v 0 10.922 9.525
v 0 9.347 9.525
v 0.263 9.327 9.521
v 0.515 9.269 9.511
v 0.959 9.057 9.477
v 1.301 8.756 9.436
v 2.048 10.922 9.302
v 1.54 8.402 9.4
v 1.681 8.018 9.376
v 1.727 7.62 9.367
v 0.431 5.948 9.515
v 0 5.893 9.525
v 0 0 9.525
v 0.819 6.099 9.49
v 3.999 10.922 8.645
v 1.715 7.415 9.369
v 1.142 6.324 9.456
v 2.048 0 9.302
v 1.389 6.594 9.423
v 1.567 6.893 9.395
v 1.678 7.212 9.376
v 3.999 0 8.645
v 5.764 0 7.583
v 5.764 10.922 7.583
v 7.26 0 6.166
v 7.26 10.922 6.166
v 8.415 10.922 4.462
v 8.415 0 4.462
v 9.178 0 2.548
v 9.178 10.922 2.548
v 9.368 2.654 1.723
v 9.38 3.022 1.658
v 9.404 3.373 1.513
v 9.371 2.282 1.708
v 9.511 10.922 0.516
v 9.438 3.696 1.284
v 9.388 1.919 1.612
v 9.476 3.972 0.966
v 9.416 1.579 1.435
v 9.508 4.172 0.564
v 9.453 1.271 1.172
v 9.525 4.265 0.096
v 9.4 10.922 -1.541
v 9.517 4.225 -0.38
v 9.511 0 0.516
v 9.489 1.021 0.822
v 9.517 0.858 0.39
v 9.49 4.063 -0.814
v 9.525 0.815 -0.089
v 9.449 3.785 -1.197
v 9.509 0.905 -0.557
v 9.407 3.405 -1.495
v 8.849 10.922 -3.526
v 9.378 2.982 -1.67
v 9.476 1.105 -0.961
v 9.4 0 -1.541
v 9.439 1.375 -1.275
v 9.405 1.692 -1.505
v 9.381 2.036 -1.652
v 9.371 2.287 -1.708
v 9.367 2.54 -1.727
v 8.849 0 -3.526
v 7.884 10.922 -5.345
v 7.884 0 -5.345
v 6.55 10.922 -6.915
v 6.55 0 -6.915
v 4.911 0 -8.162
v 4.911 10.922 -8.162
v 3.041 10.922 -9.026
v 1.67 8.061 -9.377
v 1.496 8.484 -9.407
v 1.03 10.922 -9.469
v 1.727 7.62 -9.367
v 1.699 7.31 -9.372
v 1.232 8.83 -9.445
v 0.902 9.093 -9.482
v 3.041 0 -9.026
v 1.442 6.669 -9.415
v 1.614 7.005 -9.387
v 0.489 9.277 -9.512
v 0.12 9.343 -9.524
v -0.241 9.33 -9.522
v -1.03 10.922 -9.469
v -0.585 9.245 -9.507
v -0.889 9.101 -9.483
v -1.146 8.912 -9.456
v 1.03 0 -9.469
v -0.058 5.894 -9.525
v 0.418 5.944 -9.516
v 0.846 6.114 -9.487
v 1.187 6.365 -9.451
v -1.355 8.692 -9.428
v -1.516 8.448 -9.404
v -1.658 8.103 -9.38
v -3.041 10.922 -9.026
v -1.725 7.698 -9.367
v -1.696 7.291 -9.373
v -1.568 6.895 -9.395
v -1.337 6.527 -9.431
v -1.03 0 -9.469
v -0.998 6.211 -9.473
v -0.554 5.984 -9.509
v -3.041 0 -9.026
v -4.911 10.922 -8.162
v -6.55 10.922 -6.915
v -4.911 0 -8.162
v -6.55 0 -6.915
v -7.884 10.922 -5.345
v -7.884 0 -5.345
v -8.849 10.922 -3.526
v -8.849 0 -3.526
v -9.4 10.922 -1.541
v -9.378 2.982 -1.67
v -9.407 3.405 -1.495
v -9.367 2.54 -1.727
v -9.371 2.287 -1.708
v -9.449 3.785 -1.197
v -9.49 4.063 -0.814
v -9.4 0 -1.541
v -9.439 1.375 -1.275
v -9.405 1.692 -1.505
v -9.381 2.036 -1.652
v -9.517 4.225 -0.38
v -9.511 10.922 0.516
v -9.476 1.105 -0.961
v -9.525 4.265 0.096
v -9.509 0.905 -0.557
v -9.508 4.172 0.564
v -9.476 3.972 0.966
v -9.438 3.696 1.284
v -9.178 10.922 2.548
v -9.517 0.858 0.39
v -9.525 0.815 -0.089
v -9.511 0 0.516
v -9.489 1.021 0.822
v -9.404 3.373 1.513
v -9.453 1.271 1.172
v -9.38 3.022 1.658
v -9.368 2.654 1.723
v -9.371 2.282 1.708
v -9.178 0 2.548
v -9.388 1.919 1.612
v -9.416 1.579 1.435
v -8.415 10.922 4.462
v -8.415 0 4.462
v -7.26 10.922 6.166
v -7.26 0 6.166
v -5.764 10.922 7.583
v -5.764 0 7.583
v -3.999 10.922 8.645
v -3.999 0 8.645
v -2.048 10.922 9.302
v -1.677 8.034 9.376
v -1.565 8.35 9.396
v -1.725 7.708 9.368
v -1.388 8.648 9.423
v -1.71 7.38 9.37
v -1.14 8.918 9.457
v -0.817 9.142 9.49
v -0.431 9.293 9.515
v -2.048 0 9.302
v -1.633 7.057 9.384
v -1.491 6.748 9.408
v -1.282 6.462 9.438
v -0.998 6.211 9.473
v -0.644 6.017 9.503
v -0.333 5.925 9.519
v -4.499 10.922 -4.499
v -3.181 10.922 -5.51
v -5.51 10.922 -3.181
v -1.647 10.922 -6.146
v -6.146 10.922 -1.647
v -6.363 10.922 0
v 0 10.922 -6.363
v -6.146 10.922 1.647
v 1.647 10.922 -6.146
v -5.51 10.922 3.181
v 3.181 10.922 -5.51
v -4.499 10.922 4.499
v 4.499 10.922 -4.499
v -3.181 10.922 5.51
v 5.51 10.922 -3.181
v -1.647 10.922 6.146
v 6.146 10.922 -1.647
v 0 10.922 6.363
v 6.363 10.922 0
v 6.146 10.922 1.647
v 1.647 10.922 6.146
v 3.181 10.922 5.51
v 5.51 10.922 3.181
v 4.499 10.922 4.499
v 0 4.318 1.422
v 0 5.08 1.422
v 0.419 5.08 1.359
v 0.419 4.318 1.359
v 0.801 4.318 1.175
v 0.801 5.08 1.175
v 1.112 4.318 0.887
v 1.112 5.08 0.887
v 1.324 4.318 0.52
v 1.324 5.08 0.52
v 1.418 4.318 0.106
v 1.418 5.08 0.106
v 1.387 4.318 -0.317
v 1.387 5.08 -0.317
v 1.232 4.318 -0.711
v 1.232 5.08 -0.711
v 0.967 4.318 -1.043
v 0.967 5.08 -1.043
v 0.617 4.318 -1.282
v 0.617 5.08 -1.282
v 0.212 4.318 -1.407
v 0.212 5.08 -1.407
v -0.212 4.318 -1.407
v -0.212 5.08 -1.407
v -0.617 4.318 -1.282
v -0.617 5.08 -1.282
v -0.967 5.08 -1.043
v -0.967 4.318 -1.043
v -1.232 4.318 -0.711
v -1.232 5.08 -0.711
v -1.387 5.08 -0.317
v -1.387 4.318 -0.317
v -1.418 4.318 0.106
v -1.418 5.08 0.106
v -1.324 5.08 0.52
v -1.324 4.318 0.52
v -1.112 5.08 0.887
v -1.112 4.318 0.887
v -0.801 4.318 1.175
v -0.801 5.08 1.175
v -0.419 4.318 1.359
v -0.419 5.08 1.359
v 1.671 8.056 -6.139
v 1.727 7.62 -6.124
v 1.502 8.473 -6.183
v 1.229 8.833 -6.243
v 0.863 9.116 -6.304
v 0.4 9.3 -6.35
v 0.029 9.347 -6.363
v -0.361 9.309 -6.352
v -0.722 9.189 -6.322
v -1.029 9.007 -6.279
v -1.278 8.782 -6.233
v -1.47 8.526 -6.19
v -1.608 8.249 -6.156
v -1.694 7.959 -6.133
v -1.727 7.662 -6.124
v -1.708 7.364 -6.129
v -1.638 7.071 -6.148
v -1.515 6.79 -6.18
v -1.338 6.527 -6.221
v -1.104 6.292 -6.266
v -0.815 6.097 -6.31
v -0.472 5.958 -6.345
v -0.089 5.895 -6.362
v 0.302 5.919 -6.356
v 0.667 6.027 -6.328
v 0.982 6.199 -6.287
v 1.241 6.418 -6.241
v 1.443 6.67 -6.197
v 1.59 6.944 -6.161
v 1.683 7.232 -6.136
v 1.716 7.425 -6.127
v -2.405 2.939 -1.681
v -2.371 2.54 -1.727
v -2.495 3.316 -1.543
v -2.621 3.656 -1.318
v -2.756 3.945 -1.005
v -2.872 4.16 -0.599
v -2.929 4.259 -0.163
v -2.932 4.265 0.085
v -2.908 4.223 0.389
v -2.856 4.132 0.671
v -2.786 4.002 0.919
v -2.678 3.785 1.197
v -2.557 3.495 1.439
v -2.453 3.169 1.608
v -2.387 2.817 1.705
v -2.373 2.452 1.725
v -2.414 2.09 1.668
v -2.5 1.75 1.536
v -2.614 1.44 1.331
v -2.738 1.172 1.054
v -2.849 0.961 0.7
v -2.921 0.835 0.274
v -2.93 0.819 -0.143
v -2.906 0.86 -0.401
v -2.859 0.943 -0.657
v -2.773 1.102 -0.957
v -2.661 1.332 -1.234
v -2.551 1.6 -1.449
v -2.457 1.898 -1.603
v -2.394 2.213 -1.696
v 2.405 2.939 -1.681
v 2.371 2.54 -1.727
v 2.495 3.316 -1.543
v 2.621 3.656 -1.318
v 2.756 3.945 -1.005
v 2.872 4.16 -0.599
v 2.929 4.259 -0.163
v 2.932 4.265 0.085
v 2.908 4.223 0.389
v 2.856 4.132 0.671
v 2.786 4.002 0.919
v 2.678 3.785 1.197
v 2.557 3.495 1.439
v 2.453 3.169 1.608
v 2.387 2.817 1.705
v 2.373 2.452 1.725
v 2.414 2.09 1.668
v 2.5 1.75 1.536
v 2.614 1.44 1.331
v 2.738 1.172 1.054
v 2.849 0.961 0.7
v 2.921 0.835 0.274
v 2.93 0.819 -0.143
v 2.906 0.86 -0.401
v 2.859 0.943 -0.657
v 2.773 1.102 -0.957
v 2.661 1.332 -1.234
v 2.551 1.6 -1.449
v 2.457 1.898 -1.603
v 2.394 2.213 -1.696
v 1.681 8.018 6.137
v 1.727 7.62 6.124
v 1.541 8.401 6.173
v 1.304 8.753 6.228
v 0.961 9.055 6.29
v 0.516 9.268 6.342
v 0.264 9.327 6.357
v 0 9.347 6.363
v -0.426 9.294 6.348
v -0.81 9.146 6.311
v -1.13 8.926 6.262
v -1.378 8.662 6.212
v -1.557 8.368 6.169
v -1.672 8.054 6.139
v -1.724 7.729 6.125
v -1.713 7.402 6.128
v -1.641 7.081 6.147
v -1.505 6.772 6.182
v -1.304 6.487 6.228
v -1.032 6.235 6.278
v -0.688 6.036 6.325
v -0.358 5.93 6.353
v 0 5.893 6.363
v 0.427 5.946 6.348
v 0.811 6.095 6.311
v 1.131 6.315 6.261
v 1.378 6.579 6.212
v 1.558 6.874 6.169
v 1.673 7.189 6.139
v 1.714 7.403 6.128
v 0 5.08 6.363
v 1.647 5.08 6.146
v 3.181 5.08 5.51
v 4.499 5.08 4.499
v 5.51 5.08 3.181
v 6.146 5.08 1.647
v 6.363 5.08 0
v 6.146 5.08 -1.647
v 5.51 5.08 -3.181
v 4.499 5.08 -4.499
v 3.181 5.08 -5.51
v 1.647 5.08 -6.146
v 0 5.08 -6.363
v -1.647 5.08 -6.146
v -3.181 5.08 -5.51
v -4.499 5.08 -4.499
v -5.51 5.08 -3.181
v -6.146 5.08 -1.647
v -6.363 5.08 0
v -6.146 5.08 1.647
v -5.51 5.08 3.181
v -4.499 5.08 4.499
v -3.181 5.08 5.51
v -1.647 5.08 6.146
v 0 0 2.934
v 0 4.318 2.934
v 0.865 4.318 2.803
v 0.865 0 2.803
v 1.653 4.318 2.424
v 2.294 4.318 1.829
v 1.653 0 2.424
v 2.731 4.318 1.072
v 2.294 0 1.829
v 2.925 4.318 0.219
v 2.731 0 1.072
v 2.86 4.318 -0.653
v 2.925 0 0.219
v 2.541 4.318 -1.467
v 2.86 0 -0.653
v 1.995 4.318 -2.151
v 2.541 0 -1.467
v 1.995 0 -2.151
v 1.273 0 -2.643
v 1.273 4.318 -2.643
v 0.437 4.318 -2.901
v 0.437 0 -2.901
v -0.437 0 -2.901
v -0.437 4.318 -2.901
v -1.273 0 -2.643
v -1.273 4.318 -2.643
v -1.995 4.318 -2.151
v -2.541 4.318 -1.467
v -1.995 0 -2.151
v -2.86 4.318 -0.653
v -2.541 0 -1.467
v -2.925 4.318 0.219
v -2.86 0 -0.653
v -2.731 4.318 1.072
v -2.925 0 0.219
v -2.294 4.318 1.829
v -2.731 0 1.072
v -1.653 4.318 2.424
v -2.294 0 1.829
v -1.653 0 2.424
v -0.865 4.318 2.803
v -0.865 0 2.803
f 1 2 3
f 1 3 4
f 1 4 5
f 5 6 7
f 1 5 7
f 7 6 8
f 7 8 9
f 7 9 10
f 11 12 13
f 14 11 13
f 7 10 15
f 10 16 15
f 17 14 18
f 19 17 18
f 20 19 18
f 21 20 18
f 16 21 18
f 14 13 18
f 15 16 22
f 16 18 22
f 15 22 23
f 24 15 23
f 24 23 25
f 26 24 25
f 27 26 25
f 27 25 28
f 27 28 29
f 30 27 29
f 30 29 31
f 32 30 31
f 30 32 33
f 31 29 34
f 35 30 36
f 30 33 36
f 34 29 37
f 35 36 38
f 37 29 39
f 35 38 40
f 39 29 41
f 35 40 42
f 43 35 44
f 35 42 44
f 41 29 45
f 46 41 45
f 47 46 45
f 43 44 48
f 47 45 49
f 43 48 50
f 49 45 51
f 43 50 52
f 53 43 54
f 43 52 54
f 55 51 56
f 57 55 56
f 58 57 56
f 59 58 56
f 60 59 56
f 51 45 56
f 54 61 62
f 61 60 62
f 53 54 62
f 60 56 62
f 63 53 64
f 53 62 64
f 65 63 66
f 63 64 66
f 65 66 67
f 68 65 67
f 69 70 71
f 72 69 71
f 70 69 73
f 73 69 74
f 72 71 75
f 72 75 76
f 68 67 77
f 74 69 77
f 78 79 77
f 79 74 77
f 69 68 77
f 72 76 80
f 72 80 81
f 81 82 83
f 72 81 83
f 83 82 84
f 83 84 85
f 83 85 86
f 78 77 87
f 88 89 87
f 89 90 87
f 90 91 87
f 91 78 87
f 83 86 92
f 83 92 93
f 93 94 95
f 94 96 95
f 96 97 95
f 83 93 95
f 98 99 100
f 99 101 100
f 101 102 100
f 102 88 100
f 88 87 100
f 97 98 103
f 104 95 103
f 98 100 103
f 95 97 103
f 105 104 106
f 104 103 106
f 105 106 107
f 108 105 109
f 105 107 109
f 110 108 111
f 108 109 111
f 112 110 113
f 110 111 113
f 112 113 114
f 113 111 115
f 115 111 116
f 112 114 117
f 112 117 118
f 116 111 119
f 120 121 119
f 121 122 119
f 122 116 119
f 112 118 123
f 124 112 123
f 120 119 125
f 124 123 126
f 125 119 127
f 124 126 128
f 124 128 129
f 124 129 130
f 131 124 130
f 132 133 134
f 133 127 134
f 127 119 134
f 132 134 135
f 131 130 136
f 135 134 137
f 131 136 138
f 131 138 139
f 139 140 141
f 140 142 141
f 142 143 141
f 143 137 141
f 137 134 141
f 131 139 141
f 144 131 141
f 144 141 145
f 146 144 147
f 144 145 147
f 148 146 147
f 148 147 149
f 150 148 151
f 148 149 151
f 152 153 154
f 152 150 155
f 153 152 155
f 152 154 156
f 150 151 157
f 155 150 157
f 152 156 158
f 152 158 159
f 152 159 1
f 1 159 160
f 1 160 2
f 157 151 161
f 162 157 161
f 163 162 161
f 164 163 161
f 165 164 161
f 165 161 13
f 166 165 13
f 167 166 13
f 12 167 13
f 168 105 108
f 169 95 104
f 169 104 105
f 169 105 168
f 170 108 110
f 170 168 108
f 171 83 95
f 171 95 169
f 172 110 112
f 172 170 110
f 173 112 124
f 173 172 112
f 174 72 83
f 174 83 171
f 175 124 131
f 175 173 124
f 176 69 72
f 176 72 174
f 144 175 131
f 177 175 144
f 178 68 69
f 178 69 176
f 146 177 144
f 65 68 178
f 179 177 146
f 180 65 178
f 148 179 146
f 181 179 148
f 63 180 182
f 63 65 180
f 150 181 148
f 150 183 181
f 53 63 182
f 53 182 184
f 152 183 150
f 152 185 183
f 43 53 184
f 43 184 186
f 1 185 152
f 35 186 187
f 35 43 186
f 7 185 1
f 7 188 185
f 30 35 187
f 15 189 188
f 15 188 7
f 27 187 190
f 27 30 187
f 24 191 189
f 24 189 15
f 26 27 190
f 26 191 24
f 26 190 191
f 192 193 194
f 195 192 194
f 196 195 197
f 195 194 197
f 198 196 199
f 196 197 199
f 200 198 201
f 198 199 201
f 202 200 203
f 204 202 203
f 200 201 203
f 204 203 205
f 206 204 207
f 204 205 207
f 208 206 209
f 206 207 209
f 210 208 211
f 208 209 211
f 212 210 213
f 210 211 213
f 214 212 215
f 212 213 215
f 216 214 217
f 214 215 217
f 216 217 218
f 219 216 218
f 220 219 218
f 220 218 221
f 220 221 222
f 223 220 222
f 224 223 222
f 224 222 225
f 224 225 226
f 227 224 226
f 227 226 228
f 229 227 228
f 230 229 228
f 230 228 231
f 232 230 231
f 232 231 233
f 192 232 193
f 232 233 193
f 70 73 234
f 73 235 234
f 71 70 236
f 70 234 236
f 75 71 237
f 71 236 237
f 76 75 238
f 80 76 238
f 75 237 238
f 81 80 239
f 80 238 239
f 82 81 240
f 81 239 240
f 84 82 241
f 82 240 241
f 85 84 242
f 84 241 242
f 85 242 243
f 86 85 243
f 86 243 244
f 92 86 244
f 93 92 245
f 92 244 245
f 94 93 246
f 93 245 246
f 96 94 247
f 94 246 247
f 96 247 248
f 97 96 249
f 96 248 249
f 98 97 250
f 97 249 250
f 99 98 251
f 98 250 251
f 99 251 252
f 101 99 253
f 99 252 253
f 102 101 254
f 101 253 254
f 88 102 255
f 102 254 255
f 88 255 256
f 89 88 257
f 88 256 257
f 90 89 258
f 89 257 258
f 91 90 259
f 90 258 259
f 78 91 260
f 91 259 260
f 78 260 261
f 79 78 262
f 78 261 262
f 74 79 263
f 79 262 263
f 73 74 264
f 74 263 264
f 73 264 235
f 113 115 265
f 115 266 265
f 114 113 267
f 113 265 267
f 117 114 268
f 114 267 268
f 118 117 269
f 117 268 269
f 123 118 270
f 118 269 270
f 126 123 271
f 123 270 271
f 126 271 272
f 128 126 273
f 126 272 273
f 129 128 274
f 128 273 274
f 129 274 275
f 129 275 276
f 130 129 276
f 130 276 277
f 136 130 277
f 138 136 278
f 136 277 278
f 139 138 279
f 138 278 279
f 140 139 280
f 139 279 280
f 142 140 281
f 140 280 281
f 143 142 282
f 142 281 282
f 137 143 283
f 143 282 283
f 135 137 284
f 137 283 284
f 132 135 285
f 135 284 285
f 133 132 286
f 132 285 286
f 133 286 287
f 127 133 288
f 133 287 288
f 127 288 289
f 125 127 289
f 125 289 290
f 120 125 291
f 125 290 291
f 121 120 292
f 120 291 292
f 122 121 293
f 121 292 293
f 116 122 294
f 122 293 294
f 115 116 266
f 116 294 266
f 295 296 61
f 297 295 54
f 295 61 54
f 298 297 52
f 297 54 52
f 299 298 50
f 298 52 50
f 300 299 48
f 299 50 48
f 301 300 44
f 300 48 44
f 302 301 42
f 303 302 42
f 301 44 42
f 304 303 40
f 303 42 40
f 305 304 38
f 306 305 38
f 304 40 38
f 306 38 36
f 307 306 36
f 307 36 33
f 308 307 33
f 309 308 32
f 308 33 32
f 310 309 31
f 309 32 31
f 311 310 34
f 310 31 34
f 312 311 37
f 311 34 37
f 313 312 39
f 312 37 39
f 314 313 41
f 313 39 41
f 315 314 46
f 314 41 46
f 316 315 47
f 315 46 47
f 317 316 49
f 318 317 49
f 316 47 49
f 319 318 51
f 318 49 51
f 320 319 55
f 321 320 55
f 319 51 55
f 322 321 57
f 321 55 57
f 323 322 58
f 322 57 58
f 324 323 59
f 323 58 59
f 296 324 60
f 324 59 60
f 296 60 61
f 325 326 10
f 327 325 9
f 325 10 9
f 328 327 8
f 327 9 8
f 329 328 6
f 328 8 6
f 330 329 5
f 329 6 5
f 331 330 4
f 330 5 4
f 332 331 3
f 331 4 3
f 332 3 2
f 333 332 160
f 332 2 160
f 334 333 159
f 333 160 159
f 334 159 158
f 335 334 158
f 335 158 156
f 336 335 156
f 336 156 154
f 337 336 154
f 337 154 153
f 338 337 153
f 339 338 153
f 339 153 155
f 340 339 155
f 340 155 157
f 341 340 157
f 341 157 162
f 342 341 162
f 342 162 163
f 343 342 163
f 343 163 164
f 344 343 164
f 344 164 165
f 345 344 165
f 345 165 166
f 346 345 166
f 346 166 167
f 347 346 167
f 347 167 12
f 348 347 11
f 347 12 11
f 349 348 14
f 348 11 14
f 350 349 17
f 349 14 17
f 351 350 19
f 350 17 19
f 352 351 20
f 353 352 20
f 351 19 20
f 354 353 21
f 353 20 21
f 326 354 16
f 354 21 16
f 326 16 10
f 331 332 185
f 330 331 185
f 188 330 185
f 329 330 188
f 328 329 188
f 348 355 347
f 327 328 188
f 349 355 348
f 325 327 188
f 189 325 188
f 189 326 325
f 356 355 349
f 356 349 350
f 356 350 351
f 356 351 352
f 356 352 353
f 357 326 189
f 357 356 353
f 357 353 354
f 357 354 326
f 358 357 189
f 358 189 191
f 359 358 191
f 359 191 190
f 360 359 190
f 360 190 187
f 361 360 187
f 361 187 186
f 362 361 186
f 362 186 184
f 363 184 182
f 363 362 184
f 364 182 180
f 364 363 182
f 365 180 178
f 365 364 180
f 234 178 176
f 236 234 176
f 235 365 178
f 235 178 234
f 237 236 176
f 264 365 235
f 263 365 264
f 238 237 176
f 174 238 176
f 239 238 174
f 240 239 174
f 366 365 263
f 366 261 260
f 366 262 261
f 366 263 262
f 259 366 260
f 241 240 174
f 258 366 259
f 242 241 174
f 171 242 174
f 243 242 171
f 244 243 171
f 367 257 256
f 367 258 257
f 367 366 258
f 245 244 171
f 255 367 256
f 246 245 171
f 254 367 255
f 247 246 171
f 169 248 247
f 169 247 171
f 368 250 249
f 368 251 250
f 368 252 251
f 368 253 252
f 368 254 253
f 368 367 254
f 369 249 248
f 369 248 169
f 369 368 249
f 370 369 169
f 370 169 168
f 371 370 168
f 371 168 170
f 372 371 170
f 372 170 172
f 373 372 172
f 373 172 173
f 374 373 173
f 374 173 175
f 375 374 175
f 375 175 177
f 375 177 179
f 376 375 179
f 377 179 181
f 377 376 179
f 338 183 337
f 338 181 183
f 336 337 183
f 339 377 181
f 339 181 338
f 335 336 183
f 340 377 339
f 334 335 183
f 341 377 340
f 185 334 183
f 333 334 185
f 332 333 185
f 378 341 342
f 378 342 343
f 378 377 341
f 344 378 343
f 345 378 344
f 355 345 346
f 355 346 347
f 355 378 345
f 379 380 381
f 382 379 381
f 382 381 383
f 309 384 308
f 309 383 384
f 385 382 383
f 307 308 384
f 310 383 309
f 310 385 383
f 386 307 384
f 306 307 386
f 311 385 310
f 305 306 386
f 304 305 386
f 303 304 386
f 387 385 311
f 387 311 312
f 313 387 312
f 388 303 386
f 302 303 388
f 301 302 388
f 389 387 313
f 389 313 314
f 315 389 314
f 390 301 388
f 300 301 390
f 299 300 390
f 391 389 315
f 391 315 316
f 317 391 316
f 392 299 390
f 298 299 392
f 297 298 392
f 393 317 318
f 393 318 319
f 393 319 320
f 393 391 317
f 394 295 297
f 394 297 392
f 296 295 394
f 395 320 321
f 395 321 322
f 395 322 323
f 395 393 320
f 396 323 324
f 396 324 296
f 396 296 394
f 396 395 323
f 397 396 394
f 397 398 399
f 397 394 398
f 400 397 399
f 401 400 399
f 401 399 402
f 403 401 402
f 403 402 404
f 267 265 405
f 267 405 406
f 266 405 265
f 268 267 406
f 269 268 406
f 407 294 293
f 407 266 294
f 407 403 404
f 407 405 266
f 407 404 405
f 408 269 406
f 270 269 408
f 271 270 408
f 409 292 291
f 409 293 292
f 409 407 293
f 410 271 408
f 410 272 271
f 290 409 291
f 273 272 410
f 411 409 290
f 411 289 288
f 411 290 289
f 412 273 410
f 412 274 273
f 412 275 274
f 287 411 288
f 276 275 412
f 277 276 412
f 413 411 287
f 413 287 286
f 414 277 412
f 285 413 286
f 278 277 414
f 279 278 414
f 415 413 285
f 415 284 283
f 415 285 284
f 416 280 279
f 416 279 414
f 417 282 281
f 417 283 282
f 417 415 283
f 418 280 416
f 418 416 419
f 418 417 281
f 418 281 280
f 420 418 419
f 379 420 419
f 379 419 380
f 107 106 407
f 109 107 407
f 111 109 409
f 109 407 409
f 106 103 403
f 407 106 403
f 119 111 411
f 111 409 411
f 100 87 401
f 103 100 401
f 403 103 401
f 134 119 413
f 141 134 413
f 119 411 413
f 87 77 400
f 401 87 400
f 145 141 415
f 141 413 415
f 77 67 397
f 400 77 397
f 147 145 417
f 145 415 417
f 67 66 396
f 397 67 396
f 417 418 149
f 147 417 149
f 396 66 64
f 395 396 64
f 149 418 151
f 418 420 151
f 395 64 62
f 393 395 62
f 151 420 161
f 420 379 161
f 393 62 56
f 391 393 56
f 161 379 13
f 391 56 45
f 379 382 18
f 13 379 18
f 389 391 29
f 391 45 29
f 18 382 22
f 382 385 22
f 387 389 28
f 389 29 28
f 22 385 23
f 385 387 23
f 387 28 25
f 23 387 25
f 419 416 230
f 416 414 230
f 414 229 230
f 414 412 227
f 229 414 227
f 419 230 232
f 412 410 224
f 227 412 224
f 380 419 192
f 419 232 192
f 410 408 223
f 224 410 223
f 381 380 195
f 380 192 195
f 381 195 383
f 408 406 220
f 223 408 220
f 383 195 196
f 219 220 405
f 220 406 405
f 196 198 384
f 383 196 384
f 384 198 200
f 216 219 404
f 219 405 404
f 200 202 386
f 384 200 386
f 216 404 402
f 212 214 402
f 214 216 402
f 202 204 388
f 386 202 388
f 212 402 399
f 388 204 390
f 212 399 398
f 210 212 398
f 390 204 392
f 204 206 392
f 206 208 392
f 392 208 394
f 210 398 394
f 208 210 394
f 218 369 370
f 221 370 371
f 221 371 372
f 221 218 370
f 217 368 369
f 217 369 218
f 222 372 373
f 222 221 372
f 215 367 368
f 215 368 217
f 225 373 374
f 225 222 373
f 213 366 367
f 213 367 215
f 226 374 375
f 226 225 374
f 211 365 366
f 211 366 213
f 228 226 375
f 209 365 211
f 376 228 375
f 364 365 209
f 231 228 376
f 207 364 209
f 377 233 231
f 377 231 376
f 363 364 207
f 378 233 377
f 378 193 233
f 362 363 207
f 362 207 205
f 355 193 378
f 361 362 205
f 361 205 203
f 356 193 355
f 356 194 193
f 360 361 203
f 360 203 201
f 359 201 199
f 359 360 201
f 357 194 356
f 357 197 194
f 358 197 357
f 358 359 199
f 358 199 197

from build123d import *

# Parameters (mm, degrees)
SKETCH1_R           = 9.525
SKETCH1_R_2         = 2.9337
BOSS_EXTRUDE1_DEPTH = 5.08
SKETCH2_R           = 9.525
SKETCH2_R_2         = 6.3627
BOSS_EXTRUDE2_DEPTH = 5.842
SKETCH3_R           = 1.7272
CUT_EXTRUDE1_DEPTH  = 12.7
SKETCH4_R           = 1.7272
CUT_EXTRUDE2_DEPTH  = 12.7
SKETCH6_R           = 4.231677678
SKETCH6_R_2         = 1.4224
BOSS_EXTRUDE4_DEPTH = 0.762


with BuildPart() as part:
    # Sketch1 → Boss-Extrude1 (new body)
    with BuildSketch(Plane(origin=(0, 0, 0), x_dir=(1, 0, 0), z_dir=(0, 1, 0))):
        with Locations(Location((0, 0, 0), (0, 0, 270))):
            Circle(SKETCH1_R)
        with Locations(Location((0, 0, 0), (0, 0, 270))):
            Circle(SKETCH1_R_2, mode=Mode.SUBTRACT)
    extrude(amount=BOSS_EXTRUDE1_DEPTH)

    # Sketch2 → Boss-Extrude2 (add)
    with BuildSketch(Plane(origin=(0, 5.08, 0), x_dir=(1, 0, 0), z_dir=(0, 1, 0))):
        with Locations(Location((0, 0, 0), (0, 0, 270))):
            Circle(SKETCH2_R)
        with Locations(Location((0, 0, 0), (0, 0, 270))):
            Circle(SKETCH2_R_2, mode=Mode.SUBTRACT)
    extrude(amount=BOSS_EXTRUDE2_DEPTH)

    # Sketch3 → Cut-Extrude1 (cut, symmetric)
    with BuildSketch(Plane.XY):
        with Locations((0, 7.62)):
            Circle(SKETCH3_R)
    extrude(amount=CUT_EXTRUDE1_DEPTH, both=True, mode=Mode.SUBTRACT)

    # Sketch4 → Cut-Extrude2 (cut, symmetric)
    with BuildSketch(Plane(origin=(0, 0, 0), x_dir=(0, 0, -1), z_dir=(1, 0, 0))):
        with Locations((0, 2.54)):
            Circle(SKETCH4_R)
    extrude(amount=CUT_EXTRUDE2_DEPTH, both=True, mode=Mode.SUBTRACT)

    # Sketch6 → Boss-Extrude4 (add)
    with BuildSketch(Plane(origin=(0, 5.08, 0), x_dir=(1, 0, 0), z_dir=(0, 1, 0))):
        Circle(SKETCH6_R)
        with Locations(Location((0, 0, 0), (0, 0, 270))):
            Circle(SKETCH6_R_2, mode=Mode.SUBTRACT)
    extrude(amount=-BOSS_EXTRUDE4_DEPTH)


solid = part.part
